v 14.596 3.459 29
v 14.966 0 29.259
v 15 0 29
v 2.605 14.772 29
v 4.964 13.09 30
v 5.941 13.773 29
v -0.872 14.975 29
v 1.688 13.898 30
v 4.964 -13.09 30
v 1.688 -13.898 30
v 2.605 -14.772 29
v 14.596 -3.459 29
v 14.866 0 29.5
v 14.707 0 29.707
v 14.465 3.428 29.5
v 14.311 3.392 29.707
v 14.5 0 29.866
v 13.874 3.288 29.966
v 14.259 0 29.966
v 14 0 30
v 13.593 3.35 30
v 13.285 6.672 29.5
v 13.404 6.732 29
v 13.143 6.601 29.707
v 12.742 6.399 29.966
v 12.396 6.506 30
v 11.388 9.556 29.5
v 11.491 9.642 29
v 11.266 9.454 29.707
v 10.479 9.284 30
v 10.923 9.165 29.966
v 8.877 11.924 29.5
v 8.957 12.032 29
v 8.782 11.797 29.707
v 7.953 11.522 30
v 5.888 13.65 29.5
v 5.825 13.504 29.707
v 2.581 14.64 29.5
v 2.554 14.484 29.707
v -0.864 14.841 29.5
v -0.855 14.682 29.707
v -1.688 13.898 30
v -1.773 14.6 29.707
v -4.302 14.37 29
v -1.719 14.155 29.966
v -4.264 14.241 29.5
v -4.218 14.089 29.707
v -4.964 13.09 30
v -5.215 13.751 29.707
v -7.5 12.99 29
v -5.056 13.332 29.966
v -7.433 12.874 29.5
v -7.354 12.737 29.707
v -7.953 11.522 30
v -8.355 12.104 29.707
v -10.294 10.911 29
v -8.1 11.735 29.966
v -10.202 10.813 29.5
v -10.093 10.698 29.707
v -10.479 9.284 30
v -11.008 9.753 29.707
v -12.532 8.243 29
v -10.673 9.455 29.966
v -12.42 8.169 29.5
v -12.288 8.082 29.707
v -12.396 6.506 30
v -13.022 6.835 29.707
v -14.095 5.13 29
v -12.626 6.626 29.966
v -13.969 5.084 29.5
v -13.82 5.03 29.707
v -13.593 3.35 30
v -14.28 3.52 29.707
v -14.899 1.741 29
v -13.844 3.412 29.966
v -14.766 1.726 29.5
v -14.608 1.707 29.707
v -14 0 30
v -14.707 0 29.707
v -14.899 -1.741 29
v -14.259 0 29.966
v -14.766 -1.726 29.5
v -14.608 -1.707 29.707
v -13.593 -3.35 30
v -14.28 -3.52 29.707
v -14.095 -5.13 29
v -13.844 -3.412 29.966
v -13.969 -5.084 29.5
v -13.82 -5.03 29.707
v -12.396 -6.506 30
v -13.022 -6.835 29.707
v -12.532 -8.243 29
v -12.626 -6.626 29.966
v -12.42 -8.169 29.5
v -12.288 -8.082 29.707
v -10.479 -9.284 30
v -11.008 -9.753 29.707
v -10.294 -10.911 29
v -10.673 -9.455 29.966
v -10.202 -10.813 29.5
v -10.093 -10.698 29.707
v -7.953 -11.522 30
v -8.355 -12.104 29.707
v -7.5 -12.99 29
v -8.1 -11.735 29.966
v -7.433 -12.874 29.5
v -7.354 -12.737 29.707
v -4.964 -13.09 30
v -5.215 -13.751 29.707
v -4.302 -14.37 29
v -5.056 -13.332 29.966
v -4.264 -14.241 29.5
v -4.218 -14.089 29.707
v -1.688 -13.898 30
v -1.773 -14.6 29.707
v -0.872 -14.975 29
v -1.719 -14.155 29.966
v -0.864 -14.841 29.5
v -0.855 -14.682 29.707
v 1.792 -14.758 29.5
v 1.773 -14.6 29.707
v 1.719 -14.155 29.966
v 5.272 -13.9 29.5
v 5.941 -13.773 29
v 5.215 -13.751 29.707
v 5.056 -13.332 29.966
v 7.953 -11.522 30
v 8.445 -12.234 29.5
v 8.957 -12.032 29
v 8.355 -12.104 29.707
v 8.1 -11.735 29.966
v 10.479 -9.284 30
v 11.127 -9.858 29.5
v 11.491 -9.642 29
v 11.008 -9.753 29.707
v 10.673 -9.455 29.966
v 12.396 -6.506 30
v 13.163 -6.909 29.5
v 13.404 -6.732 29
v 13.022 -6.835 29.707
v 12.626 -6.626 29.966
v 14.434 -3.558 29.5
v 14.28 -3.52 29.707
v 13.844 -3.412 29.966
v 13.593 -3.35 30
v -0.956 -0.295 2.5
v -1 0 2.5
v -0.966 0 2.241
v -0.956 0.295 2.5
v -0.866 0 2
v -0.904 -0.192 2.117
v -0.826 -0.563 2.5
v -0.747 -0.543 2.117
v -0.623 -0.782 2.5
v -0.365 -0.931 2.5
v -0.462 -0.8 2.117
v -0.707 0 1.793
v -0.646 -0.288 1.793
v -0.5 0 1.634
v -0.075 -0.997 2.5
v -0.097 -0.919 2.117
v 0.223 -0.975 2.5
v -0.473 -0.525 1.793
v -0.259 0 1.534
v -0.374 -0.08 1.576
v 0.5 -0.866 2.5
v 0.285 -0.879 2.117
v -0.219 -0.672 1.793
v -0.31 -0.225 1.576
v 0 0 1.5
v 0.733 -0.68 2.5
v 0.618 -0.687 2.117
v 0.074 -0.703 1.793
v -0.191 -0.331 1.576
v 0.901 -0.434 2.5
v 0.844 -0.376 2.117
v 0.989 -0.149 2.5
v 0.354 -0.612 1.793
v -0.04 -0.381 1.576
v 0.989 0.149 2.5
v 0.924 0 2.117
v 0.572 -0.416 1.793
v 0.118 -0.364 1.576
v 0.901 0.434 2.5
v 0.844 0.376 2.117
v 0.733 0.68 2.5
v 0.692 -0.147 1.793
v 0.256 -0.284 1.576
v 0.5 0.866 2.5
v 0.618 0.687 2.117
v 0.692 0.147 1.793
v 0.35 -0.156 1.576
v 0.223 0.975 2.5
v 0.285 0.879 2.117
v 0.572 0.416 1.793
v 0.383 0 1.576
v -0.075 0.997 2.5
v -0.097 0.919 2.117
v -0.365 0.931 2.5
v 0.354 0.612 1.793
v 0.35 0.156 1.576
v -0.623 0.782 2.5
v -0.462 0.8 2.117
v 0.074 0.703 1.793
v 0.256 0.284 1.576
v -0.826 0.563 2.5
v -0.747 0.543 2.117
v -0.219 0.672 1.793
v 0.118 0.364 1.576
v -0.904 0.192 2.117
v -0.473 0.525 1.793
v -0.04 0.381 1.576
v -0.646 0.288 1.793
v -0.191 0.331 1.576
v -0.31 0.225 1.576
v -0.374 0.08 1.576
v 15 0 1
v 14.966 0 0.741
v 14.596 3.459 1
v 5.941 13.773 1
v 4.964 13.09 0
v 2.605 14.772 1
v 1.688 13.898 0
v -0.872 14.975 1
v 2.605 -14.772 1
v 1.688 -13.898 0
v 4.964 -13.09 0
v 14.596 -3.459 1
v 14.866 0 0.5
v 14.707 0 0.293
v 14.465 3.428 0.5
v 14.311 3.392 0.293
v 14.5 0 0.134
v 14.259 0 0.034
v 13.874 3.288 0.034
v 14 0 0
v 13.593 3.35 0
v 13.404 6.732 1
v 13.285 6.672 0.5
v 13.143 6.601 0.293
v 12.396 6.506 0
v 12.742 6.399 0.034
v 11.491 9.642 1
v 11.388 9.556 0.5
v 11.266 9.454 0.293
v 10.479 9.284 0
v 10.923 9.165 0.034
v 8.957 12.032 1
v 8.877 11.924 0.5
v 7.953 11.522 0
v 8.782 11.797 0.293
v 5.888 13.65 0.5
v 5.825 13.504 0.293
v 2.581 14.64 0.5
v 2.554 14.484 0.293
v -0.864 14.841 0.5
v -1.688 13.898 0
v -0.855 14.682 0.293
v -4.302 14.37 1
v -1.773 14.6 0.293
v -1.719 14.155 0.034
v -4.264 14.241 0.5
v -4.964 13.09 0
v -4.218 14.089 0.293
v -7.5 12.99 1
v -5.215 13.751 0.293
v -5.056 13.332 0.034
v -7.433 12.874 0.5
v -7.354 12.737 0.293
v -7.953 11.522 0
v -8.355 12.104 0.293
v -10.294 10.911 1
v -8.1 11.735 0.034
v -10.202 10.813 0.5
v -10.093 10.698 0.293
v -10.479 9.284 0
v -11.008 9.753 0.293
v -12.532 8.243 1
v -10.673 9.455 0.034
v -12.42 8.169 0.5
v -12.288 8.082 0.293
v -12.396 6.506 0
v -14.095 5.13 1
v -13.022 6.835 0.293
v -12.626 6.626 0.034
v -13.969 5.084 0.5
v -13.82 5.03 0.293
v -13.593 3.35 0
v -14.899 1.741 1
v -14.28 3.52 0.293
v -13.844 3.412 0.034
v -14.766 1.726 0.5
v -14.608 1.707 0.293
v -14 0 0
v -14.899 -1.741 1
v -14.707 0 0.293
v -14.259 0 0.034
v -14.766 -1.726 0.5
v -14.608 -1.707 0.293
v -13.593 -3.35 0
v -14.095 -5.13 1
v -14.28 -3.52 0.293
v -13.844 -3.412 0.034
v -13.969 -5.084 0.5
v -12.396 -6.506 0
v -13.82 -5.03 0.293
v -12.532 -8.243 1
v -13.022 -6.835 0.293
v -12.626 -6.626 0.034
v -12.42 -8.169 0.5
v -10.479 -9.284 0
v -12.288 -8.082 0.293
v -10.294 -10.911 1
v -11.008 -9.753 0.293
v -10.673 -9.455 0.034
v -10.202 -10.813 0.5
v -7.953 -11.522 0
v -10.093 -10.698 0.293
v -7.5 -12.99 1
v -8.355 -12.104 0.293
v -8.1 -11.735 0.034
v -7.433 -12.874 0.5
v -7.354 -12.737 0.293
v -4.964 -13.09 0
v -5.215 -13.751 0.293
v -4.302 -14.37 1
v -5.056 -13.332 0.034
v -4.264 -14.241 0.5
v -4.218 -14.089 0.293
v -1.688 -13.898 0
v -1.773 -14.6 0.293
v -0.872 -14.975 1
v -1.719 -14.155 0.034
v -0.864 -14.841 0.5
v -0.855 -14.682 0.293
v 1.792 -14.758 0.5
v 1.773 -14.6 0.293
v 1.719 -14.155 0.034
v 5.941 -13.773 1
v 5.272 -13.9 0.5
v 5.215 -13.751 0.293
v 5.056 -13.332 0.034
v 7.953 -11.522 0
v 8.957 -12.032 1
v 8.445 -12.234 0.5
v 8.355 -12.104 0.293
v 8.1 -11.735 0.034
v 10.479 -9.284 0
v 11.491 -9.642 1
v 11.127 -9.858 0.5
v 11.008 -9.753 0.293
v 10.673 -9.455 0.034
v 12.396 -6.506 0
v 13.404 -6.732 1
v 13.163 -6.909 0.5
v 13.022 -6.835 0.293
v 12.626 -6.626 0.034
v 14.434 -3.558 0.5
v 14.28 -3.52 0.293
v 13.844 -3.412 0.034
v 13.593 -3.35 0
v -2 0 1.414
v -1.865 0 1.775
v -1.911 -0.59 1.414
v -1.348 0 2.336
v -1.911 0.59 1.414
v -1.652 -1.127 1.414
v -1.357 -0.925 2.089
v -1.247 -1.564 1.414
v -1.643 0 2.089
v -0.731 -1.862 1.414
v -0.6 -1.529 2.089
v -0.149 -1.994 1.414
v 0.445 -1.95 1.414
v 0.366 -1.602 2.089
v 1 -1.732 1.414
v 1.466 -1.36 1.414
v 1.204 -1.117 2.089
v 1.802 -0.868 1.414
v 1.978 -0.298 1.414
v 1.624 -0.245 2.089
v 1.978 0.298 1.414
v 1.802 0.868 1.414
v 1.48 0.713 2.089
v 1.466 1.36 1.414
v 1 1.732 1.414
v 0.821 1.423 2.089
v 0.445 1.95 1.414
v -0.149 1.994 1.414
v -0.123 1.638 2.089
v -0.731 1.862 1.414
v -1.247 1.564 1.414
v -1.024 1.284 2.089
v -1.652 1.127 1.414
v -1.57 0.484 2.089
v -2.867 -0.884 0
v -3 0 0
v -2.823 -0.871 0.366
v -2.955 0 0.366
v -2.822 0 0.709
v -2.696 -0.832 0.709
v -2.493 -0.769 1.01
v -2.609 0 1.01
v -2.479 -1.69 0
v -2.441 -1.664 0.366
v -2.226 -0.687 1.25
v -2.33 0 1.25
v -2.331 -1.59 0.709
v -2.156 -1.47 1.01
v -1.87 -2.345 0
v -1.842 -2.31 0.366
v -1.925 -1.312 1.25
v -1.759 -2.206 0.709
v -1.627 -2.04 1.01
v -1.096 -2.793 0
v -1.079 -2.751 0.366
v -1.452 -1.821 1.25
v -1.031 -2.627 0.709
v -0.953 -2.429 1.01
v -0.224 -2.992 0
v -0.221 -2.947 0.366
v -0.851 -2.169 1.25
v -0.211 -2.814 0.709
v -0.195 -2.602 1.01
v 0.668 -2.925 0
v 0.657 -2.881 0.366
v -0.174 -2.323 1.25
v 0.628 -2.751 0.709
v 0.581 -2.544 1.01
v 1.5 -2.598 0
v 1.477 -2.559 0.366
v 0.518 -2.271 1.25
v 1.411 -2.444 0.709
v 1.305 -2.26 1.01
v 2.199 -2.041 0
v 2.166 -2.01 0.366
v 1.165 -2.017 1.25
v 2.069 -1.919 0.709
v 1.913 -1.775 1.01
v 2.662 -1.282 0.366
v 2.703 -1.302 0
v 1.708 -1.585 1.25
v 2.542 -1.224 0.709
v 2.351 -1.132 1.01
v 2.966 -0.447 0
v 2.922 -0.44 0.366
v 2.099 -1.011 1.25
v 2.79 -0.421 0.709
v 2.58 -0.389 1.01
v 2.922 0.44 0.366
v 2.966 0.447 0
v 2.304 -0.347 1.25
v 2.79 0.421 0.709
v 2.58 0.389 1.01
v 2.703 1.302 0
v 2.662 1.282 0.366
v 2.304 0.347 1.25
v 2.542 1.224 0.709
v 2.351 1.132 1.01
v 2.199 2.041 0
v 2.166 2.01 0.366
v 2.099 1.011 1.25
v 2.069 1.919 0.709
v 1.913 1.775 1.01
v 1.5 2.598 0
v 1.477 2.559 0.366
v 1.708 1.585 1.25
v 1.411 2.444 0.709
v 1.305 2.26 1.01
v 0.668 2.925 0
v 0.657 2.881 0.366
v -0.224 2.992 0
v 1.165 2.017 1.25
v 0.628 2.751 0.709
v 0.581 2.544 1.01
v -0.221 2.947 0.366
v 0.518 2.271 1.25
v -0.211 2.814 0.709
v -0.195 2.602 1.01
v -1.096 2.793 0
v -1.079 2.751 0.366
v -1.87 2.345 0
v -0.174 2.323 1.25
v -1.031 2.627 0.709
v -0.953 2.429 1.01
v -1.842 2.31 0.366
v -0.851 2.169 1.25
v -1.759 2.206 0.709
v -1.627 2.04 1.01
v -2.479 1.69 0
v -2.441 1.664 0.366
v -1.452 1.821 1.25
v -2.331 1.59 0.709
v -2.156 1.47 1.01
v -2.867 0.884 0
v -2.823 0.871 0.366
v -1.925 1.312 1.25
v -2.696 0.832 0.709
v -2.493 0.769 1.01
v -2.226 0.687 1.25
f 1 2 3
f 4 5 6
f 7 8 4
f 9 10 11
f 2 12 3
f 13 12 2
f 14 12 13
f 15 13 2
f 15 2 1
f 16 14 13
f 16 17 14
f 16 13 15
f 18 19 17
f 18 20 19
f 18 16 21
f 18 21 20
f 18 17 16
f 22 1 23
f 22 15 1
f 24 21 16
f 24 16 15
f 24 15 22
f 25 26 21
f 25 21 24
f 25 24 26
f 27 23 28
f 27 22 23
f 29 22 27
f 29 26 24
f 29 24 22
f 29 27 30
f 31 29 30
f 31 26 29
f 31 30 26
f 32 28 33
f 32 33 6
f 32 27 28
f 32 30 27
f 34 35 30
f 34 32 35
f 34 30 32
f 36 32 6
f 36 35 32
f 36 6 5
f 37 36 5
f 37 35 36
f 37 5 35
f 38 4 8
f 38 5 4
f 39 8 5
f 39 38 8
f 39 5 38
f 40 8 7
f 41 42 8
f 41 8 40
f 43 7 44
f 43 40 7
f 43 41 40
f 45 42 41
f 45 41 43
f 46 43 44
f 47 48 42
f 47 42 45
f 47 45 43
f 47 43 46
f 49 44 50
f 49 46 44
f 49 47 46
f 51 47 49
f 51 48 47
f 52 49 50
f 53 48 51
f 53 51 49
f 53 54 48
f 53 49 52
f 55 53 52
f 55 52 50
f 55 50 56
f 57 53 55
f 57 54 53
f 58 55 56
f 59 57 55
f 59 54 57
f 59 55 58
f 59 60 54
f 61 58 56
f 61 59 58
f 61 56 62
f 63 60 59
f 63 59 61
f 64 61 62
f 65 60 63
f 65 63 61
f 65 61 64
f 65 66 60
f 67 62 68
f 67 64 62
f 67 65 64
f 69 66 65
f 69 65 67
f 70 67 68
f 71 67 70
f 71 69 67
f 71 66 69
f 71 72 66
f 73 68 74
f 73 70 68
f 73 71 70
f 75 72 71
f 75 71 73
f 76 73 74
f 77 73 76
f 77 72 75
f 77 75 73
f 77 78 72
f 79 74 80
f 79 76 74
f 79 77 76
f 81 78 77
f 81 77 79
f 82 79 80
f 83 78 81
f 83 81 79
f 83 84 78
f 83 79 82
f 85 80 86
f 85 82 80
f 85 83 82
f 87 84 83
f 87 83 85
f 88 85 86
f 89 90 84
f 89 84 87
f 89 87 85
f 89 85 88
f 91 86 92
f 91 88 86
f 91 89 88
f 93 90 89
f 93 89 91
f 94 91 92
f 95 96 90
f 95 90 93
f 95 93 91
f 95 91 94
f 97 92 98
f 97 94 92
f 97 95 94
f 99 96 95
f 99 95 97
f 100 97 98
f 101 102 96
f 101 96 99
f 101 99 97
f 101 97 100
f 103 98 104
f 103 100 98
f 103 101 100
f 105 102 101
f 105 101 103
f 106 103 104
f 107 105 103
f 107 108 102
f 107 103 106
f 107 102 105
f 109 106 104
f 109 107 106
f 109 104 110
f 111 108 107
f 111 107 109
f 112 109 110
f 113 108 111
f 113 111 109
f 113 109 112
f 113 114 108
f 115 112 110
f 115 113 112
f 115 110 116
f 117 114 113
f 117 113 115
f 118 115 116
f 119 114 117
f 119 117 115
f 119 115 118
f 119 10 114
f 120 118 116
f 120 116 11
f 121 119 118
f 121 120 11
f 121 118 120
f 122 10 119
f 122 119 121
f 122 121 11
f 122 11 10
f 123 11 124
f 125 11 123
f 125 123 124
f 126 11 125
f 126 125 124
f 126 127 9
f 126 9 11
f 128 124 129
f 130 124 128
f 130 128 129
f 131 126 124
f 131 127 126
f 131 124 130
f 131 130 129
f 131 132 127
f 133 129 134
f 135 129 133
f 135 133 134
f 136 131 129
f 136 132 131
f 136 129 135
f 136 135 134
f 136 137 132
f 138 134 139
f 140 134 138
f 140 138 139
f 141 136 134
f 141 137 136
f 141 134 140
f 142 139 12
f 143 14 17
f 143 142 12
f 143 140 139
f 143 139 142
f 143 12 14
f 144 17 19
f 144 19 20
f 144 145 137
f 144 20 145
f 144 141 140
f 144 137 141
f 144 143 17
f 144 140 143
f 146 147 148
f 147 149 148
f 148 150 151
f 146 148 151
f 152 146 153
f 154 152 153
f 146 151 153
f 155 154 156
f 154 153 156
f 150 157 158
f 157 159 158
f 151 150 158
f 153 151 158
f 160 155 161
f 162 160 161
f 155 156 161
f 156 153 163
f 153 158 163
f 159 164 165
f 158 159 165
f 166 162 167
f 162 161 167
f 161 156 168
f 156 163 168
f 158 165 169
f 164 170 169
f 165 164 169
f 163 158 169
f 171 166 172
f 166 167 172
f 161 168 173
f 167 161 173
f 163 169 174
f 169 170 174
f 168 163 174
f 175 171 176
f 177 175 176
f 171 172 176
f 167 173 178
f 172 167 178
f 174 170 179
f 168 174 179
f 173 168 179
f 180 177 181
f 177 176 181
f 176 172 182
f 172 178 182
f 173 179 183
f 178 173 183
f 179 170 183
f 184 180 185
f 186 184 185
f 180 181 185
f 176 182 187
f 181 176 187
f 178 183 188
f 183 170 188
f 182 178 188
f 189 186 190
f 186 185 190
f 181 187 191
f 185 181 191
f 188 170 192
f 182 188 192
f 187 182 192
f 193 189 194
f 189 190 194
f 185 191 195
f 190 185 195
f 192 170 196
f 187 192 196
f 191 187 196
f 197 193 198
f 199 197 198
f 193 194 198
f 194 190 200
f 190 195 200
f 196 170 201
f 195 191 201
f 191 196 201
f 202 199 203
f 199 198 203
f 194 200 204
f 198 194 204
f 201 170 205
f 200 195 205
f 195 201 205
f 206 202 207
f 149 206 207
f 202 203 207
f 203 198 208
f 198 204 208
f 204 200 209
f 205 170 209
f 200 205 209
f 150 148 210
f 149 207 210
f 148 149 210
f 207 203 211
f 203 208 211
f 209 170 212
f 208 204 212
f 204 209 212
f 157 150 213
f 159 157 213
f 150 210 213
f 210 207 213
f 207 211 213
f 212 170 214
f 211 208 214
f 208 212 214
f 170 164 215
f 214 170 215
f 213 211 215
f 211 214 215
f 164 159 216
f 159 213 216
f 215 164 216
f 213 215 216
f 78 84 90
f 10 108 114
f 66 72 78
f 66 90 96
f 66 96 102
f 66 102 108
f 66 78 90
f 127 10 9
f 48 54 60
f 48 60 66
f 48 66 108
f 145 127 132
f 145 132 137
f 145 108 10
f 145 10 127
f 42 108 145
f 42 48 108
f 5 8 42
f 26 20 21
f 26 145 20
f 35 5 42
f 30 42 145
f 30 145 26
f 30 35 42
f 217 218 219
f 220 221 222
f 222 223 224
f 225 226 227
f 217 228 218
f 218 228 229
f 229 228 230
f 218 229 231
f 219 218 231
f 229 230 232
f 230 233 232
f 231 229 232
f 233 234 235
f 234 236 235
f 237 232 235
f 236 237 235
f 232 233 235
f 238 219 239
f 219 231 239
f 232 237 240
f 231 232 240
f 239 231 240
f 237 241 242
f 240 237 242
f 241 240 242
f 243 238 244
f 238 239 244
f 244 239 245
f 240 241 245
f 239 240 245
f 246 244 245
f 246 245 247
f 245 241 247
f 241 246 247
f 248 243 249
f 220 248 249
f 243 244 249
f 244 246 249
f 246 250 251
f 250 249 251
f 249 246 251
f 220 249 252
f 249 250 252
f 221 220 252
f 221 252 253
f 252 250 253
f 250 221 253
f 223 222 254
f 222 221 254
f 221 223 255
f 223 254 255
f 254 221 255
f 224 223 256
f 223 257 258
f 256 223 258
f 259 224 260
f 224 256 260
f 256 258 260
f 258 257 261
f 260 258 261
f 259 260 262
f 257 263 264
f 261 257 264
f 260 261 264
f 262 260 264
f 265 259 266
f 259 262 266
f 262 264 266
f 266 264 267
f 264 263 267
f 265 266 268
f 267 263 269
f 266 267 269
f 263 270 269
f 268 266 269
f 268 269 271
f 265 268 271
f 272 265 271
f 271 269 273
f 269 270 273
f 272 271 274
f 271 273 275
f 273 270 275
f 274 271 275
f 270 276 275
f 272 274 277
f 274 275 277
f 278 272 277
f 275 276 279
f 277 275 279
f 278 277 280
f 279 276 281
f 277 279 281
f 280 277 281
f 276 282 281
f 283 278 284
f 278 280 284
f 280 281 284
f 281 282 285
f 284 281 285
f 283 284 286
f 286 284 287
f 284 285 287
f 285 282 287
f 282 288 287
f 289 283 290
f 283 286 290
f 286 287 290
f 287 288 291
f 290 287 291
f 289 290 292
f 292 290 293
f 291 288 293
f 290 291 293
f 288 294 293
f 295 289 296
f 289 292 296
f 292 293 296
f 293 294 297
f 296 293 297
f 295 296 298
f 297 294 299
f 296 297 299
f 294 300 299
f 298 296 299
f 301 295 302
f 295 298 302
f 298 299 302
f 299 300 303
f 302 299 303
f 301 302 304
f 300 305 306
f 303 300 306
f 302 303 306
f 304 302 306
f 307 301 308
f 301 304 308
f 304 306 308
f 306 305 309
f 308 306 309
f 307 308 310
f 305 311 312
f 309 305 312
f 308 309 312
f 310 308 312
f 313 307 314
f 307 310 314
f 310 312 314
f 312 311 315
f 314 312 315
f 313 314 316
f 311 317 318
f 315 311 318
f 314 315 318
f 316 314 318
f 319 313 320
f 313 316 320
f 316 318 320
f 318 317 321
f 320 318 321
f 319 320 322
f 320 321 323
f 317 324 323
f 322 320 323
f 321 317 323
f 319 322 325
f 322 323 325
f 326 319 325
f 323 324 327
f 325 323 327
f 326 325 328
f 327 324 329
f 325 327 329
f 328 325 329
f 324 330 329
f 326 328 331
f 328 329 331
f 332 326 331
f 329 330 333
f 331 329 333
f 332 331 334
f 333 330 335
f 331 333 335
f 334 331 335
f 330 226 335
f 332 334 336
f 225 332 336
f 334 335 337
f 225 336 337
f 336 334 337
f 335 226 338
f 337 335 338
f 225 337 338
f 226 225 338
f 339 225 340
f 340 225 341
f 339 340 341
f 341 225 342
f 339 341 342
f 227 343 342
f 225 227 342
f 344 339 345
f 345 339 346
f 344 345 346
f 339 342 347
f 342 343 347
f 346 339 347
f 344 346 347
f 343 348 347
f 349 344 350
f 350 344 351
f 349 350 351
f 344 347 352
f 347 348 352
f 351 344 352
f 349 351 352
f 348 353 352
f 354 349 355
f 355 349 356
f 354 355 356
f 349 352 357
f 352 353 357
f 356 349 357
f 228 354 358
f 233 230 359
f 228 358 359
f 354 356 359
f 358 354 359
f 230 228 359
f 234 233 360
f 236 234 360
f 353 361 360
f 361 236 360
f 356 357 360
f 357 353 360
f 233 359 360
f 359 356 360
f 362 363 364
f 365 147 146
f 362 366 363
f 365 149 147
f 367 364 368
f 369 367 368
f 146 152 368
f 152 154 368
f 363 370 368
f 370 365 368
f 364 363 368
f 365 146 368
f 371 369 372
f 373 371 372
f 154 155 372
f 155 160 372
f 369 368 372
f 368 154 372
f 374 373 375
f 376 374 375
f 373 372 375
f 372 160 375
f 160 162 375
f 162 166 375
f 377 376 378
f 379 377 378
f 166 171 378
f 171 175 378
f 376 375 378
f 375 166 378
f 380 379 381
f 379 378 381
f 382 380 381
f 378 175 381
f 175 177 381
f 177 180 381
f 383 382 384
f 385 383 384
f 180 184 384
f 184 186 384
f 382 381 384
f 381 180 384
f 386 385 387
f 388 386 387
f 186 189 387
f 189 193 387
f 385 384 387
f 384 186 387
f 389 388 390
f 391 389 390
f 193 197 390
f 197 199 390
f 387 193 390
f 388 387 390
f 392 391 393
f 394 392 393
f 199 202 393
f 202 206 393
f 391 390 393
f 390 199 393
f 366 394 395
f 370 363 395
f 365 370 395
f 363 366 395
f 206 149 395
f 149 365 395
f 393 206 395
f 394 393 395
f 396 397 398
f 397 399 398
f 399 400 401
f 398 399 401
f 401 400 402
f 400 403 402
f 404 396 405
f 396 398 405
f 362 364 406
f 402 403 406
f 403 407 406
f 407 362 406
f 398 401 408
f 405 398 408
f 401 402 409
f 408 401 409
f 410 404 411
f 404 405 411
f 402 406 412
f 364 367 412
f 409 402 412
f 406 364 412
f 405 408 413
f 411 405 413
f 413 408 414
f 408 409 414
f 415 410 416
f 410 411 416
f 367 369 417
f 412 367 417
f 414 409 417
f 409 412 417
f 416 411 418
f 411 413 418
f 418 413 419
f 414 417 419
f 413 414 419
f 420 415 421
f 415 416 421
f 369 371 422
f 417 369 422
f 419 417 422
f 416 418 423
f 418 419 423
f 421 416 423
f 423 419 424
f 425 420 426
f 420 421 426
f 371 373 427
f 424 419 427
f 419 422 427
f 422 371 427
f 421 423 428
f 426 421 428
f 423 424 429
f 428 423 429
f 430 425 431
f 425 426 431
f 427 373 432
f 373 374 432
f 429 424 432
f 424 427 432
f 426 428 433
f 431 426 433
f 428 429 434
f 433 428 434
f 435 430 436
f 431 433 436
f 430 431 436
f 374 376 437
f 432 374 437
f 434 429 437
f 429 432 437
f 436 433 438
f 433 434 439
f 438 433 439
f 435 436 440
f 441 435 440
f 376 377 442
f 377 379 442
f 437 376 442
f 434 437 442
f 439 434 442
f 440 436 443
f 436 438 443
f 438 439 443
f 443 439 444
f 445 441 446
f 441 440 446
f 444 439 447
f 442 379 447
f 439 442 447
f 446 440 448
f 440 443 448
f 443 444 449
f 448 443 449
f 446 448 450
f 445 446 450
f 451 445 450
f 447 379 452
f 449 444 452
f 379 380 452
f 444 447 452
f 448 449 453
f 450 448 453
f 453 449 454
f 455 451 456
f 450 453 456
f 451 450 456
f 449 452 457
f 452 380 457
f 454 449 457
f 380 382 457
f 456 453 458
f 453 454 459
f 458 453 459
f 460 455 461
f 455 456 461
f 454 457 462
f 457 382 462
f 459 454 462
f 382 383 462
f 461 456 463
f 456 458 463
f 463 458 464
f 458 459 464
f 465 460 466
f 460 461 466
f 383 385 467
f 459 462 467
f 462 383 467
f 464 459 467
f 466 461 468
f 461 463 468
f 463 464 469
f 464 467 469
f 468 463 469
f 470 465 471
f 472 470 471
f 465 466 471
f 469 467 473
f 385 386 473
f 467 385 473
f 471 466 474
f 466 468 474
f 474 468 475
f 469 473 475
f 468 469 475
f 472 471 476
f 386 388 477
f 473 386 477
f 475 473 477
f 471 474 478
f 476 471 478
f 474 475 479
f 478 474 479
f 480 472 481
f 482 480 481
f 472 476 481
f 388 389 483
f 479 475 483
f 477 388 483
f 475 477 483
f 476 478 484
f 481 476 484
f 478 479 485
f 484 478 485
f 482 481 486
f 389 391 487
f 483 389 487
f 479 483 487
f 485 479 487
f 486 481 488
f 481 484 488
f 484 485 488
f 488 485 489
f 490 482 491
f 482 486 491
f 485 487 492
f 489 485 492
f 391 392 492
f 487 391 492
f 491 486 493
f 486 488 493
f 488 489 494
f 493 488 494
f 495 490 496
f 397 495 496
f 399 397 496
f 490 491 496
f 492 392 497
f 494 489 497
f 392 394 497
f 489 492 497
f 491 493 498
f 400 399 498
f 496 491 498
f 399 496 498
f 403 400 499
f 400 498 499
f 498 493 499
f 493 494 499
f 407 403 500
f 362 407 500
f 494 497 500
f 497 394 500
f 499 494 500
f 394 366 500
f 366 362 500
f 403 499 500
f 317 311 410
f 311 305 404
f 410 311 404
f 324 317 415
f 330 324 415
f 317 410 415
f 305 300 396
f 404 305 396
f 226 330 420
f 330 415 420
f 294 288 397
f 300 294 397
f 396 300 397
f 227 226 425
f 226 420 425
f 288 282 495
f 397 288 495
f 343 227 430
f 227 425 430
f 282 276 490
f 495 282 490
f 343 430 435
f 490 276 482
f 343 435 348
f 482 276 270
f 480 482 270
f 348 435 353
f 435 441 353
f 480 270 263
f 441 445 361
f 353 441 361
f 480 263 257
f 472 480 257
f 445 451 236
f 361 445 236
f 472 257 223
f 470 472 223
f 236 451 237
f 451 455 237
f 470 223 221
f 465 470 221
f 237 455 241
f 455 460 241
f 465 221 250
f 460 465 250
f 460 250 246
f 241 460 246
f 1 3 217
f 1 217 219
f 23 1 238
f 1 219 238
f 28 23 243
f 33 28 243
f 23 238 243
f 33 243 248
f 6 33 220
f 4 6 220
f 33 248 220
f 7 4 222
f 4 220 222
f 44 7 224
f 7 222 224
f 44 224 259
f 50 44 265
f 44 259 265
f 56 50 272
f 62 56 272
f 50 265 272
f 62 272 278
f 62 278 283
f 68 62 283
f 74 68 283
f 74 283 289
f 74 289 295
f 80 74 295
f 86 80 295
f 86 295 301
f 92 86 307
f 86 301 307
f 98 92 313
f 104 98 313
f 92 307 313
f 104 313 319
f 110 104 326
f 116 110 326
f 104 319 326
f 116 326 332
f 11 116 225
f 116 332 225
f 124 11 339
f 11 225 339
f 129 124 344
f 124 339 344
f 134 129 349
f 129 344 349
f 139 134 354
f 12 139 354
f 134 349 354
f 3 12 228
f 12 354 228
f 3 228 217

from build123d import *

# Parameters (mm, degrees)
SKETCH_1_R      = 15
EXTRUDE_1_DEPTH = 30
FILLET_1_R      = 1


with BuildPart() as part:
    # 草图1 → 凸台-拉伸1 (new body)
    with BuildSketch(Plane.XY):
        Circle(SKETCH_1_R)
    extrude(amount=EXTRUDE_1_DEPTH)

    # 圆角1
    fillet_1_edges = [part.edges().sort_by_distance(p)[0] for p in [
        (-15, 0, 0),
        (-15, 0, 30),
    ]]
    fillet(fillet_1_edges, radius=FILLET_1_R)

    # 草图2 → 切除-旋转1 (revolve, cut)
    with BuildSketch(Plane(origin=(0, 0, 0), x_dir=(1, 0, 0), z_dir=(0, 1, 0)), mode=Mode.PRIVATE) as cut_revolve_1_sk:
        with BuildLine():
            Line((0, 0), (3, 0))
            ThreePointArc((3, 0), (2.724744871, -0.866025404), (2, -1.414213562))
            ThreePointArc((2, -1.414213562), (1.642804036, -2.088628074), (1, -2.5))
            ThreePointArc((1, -2.5), (0.707106781, -1.792893219), (0, -1.5))
            Line((0, -1.5), (0, 0))
        make_face()
    revolve(cut_revolve_1_sk.sketch.rotate(Axis((0, 0, -2.778762471), (0, 0, 1)), 180), axis=Axis((0, 0, -2.778762471), (0, 0, 1)), mode=Mode.SUBTRACT)


solid = part.part
